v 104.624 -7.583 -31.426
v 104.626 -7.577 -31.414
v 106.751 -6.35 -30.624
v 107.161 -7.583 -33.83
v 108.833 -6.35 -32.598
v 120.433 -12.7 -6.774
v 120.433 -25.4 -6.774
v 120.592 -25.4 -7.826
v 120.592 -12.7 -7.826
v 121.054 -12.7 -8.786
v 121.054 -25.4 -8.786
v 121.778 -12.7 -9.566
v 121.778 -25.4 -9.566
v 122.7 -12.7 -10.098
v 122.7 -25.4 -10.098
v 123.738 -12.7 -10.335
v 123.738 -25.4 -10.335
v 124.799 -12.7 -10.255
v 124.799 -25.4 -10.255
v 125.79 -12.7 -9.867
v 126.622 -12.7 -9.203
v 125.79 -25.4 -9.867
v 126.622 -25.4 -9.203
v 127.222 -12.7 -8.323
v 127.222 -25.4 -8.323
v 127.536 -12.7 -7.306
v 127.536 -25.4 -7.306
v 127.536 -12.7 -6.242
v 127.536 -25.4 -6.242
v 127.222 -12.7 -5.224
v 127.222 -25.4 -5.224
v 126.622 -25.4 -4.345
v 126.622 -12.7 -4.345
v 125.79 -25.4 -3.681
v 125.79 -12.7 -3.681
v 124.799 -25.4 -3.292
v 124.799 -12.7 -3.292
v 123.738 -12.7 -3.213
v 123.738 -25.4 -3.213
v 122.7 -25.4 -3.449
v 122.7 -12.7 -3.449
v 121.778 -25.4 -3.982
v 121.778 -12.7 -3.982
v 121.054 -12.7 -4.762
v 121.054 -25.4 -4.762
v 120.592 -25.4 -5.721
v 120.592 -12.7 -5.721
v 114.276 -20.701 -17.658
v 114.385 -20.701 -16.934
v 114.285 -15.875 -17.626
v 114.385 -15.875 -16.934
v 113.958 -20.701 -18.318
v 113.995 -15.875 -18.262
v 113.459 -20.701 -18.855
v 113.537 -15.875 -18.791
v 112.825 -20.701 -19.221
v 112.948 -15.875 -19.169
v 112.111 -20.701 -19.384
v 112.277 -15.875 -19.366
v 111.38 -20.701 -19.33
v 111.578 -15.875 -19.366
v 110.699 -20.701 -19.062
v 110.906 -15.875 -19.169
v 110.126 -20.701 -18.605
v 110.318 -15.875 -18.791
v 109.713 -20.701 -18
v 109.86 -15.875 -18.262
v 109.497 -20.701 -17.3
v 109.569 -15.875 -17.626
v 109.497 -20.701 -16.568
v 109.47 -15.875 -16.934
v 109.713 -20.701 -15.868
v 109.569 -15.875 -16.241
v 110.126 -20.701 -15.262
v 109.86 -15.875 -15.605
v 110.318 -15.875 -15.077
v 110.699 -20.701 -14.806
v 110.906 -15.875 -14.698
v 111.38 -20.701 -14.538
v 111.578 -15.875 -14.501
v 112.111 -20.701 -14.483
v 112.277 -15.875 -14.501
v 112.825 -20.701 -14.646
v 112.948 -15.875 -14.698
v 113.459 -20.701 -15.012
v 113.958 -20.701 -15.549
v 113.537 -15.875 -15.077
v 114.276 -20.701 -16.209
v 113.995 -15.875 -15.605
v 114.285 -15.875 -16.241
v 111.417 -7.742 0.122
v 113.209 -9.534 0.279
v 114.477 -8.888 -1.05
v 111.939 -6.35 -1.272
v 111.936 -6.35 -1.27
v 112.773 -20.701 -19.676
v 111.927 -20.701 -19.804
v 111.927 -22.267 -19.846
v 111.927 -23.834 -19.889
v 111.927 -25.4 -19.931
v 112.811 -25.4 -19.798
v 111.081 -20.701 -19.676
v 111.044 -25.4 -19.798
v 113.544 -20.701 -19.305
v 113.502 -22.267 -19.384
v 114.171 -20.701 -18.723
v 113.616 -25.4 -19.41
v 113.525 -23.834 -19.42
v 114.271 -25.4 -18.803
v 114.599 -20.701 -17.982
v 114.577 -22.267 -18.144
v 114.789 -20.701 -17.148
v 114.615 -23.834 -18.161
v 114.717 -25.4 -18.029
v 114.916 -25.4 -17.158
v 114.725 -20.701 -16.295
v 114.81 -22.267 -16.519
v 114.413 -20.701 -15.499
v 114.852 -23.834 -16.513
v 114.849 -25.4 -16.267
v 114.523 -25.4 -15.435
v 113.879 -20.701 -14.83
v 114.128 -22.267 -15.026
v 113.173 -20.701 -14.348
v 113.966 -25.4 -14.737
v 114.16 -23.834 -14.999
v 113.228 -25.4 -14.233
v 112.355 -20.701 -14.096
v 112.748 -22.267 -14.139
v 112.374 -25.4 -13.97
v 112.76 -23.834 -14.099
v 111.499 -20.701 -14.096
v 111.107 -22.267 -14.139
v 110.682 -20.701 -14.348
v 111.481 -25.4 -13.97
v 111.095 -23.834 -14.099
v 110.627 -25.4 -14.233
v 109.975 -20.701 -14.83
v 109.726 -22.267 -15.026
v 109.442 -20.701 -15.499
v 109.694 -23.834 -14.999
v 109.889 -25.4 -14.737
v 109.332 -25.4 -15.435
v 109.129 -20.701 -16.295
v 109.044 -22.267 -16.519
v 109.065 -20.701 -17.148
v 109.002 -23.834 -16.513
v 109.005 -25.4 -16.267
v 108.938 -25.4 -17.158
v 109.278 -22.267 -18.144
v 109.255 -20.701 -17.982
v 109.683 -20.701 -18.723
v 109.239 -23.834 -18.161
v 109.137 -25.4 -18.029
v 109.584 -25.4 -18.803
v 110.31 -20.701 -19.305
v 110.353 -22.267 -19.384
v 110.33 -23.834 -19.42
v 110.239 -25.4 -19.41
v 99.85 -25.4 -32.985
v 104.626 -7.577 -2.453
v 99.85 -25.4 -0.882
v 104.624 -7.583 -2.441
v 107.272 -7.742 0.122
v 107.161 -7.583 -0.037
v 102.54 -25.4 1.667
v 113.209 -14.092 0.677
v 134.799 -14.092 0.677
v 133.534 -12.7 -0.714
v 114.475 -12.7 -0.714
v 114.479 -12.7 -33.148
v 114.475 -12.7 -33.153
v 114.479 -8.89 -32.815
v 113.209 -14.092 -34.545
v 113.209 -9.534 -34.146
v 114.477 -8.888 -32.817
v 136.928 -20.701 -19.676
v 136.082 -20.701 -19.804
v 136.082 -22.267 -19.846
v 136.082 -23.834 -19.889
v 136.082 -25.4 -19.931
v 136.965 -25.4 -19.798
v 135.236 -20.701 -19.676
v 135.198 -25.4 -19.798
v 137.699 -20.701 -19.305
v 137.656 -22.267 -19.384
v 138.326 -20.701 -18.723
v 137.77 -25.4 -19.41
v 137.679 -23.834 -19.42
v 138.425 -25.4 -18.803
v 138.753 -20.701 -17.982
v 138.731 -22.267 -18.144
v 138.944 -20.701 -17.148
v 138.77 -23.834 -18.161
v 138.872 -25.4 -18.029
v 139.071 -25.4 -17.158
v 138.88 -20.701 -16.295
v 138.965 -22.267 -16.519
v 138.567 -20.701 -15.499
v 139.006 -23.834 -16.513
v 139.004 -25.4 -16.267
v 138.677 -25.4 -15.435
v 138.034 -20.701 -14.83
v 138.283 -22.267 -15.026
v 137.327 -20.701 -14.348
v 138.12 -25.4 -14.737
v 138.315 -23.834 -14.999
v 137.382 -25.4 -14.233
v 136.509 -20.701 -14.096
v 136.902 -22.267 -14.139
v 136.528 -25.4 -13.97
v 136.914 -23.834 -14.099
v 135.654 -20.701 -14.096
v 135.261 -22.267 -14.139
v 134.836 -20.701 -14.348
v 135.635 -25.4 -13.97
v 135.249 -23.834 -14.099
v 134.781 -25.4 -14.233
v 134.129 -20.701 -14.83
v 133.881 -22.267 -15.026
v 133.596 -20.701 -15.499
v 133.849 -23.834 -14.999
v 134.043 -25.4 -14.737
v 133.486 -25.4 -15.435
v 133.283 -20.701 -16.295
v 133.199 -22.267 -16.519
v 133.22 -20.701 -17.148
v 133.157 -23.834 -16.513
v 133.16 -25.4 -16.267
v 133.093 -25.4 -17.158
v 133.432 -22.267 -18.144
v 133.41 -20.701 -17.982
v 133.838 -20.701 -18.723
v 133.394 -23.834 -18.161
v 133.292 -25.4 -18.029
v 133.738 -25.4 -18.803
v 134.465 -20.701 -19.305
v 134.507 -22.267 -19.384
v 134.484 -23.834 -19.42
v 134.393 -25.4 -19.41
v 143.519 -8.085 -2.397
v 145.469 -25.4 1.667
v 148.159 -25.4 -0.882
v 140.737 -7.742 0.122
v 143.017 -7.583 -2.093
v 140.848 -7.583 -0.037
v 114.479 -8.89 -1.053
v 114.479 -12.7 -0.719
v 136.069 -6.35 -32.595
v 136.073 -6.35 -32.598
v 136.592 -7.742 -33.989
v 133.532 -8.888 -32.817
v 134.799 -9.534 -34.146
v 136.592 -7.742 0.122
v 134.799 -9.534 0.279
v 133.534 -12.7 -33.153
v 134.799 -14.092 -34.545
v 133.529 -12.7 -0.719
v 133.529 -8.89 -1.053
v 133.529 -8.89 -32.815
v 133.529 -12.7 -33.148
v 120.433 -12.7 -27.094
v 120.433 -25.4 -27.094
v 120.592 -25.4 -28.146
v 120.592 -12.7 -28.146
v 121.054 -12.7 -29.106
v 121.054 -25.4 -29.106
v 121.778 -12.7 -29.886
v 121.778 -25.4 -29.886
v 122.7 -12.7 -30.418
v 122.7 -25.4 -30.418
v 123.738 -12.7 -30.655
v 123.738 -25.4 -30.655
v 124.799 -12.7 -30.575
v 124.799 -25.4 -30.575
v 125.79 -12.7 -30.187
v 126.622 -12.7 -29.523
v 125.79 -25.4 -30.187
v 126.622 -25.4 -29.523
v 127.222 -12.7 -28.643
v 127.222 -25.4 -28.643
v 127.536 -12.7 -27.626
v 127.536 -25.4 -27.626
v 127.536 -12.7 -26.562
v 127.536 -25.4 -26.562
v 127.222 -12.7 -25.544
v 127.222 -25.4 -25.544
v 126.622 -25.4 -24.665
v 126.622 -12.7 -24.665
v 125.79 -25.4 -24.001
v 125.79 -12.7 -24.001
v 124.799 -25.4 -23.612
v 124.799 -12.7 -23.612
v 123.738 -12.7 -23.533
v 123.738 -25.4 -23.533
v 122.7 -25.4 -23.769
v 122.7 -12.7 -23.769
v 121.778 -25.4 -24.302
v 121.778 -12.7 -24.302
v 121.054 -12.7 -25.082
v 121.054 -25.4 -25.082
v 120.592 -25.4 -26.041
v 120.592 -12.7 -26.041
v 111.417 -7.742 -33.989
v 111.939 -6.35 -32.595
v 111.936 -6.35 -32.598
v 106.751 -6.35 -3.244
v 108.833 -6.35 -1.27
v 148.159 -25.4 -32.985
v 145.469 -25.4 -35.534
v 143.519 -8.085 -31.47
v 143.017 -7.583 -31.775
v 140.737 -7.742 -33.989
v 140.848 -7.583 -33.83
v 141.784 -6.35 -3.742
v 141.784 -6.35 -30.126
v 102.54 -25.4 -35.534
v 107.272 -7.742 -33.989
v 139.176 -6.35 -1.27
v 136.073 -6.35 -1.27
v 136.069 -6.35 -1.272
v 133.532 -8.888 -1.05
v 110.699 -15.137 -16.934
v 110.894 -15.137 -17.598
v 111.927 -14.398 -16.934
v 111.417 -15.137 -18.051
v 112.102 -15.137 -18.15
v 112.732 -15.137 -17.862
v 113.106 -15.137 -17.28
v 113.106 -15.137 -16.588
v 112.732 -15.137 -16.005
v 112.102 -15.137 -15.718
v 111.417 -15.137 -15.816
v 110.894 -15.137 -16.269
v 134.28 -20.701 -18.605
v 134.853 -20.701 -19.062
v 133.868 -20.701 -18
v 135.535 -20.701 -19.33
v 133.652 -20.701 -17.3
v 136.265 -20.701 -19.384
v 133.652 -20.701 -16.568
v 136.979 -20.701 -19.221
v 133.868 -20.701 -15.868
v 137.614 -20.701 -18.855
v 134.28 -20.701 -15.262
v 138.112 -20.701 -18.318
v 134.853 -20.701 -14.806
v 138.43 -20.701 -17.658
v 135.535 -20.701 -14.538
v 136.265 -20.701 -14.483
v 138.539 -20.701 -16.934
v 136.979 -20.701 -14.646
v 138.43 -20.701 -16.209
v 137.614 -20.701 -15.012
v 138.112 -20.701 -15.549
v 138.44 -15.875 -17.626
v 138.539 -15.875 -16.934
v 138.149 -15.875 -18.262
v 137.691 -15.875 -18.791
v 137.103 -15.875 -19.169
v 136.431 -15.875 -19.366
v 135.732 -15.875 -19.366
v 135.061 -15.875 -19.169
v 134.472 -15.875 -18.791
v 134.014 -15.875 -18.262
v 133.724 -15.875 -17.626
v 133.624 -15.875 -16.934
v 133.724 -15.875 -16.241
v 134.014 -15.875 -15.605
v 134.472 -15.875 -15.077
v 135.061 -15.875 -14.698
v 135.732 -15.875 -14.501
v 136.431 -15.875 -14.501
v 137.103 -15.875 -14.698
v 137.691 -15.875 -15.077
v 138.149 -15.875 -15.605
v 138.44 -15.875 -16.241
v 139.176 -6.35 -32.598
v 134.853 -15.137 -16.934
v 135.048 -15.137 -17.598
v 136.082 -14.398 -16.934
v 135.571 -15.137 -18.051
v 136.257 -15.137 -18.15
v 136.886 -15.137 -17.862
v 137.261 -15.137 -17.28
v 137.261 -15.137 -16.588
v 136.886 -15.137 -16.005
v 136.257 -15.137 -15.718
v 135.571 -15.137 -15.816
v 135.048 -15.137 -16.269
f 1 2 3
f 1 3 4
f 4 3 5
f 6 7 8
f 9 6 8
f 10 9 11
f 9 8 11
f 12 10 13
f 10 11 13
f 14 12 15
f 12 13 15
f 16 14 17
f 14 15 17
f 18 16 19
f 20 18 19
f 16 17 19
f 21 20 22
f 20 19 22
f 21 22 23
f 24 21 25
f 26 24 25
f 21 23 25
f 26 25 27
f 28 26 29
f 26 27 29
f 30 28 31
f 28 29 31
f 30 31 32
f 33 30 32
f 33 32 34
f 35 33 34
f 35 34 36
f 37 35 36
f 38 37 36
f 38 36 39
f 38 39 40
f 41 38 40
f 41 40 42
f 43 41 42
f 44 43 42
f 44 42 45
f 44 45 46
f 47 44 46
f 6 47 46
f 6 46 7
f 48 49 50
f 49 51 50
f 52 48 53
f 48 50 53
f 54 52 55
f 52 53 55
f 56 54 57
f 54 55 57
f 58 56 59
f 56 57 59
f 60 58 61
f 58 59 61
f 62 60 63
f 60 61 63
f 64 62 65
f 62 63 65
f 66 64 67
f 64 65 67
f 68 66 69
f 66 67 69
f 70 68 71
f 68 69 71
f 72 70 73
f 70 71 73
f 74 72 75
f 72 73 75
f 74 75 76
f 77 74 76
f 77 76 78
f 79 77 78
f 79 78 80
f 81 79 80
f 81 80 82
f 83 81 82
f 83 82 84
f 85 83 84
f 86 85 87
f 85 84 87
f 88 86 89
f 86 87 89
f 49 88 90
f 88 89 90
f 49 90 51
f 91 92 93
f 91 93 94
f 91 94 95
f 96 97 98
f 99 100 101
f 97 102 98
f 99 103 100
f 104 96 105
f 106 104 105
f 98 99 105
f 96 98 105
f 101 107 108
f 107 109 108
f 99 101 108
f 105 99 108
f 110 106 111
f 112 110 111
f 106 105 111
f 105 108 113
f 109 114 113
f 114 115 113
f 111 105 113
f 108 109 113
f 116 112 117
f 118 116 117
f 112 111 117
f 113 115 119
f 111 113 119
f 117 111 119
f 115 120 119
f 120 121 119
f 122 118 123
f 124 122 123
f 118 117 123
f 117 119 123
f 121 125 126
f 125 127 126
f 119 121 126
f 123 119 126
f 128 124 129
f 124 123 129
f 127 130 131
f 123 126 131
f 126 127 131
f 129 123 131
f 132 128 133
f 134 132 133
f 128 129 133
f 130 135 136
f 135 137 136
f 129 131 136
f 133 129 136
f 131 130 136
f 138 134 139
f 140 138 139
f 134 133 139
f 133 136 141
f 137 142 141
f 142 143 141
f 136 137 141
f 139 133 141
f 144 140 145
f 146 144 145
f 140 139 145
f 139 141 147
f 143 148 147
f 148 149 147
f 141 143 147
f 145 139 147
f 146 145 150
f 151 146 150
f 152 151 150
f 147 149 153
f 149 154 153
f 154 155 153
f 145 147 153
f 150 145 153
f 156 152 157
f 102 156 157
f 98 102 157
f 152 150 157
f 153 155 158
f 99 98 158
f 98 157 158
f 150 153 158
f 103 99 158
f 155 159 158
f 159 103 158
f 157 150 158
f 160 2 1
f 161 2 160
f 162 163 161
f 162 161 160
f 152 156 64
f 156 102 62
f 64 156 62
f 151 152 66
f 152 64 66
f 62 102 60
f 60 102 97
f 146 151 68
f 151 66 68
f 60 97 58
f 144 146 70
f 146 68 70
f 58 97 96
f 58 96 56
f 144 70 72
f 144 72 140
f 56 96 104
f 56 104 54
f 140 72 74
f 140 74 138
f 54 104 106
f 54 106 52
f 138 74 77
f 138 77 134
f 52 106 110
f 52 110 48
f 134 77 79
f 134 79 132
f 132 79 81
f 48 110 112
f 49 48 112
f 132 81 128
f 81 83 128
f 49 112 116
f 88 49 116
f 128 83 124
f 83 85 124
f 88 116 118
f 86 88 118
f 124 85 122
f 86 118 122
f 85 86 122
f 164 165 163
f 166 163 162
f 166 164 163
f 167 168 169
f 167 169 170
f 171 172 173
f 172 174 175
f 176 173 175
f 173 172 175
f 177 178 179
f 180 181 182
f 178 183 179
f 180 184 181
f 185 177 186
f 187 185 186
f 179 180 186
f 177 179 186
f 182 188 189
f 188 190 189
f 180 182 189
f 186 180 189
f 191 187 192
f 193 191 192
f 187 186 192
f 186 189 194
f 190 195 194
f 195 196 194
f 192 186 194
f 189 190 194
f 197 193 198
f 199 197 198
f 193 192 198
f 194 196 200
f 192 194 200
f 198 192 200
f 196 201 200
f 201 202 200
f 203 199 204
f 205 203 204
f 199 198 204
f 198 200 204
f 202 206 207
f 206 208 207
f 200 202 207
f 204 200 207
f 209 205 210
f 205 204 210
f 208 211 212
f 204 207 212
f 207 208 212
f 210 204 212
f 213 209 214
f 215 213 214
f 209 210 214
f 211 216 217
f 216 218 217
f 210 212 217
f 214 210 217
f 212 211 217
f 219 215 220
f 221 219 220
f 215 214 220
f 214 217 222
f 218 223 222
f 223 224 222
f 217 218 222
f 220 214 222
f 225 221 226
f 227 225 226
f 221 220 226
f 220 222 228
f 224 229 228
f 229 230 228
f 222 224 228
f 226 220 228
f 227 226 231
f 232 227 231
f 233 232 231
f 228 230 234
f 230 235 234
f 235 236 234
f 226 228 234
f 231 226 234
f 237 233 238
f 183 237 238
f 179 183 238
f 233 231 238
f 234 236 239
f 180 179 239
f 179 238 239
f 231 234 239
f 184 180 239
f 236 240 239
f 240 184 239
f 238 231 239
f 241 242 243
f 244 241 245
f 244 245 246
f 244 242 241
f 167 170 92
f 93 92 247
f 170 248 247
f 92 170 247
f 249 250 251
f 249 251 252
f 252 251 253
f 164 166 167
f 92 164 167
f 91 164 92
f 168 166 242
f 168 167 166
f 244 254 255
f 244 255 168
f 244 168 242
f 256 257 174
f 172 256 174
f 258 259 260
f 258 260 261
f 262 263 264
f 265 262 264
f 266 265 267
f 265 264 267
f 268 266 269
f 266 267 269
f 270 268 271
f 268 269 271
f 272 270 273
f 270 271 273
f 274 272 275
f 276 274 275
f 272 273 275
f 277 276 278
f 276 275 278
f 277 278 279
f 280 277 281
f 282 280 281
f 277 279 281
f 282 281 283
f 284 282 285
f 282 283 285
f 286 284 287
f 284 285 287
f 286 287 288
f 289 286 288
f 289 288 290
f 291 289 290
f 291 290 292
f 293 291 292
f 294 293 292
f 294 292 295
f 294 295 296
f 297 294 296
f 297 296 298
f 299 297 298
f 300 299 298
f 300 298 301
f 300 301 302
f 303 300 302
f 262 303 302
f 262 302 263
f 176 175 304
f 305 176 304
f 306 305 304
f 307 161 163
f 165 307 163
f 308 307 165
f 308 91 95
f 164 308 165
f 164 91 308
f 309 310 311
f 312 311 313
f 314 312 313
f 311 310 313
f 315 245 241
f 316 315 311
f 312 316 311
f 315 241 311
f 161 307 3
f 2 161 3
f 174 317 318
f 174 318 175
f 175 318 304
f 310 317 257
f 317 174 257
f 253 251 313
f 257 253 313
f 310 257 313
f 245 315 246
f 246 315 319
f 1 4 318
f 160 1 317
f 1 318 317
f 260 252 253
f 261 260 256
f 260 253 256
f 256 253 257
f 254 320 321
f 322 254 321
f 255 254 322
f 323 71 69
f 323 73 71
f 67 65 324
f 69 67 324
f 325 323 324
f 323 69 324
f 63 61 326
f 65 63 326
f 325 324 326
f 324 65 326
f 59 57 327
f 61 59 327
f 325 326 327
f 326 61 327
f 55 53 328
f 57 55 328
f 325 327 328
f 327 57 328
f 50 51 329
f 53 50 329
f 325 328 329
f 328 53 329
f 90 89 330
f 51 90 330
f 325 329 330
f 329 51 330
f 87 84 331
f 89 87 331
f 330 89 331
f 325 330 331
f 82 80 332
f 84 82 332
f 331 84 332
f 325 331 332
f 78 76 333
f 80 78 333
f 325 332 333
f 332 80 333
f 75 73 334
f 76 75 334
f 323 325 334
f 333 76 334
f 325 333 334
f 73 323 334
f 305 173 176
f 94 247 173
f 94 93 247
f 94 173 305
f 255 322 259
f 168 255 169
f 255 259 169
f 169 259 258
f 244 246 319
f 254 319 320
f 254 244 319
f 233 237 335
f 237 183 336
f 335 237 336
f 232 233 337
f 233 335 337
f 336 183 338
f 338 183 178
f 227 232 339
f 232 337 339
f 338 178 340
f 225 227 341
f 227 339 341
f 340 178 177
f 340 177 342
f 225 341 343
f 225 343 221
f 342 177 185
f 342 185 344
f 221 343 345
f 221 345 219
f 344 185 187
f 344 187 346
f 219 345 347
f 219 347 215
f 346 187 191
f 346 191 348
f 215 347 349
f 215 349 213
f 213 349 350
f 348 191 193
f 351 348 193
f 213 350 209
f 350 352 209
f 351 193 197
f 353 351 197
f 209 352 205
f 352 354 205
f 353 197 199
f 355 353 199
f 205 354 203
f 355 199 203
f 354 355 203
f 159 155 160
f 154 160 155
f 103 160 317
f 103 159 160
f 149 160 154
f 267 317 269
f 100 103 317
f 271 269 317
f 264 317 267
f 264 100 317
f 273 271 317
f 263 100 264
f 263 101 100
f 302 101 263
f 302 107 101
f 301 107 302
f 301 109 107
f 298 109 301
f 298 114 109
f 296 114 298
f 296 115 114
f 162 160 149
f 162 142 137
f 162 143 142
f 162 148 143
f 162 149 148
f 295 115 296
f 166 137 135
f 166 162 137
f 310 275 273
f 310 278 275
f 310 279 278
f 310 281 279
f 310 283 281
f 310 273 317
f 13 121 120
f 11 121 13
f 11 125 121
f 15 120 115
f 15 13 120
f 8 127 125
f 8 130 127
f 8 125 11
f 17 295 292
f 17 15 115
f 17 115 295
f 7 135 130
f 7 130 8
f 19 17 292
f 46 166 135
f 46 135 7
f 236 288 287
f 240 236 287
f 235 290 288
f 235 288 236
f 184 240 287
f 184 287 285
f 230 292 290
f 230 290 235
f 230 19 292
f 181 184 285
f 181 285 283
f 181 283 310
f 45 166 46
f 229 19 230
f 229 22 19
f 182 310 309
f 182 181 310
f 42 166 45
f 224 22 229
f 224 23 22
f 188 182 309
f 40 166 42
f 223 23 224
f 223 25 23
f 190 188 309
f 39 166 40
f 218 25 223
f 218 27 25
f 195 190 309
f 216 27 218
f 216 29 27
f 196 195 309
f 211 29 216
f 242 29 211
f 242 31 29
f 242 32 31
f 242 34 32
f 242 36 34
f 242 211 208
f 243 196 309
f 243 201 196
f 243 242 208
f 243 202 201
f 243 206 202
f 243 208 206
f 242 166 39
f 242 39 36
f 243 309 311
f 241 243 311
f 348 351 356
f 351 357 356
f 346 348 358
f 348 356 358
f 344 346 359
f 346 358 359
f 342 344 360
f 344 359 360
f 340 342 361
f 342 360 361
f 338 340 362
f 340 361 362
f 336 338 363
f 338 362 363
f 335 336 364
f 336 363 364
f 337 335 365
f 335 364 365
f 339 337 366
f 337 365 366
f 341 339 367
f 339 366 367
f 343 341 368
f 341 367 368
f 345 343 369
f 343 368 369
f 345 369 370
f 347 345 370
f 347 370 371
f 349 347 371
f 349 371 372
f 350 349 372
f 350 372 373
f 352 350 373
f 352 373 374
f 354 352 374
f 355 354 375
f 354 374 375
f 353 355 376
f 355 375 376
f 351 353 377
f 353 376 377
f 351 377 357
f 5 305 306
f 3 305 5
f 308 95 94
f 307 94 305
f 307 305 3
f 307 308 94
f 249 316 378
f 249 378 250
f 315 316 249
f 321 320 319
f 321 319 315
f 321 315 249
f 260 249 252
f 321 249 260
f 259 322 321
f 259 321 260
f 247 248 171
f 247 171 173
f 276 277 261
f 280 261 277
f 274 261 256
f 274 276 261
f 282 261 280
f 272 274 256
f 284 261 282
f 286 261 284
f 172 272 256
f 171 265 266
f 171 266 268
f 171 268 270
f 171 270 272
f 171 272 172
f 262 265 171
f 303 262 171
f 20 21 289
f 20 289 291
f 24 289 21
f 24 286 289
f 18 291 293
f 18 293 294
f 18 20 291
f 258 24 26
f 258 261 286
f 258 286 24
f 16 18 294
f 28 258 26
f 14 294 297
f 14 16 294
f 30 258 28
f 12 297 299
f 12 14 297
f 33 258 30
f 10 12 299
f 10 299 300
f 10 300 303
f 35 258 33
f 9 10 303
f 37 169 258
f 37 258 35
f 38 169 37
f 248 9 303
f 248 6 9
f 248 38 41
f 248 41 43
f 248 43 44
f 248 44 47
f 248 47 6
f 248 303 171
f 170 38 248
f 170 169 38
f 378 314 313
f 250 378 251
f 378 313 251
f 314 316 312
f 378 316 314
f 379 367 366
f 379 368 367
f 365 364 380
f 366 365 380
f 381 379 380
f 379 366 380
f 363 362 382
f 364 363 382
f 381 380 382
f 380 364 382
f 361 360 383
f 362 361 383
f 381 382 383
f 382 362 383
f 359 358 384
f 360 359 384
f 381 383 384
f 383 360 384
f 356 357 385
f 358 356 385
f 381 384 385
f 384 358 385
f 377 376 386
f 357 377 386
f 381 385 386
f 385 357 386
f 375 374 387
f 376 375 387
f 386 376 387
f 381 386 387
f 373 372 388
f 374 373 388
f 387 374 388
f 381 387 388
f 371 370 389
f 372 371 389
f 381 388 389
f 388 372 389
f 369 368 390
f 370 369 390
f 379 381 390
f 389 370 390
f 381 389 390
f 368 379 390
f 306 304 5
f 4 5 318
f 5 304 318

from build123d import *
from OCP.BRepFilletAPI import BRepFilletAPI_MakeChamfer

# Parameters (mm, degrees)
BOSS_EXTRUDE1_DEPTH       = 33.86758938
F_1_4_CLEARANCE_HOLE1_D   = 7.14248
DRAFT1_ANGLE              = 15
DRAFT2_ANGLE              = 15
DRAFT3_ANGLE              = 5
DRAFT4_ANGLE              = 5
CHAMFER1_SIZE             = 2.54
CHAMFER1_SIZE2            = 2.599295174
CHAMFER2_SIZE             = 1.27
CHAMFER2_SIZE2            = 1.356155551
CHAMFER2_SIZE2_2          = 1.397079842
CHAMFER2_SIZE2_3          = 1.796051224
CHAMFER2_SIZE2_4          = 1.739452222
HOLE1_AT_2_COUNT          = 2
HOLE1_AT_2_PITCH          = 24.154432116
F_8_CLEARANCE_HOLE1_D     = 4.9149
F_8_CLEARANCE_HOLE1_DEPTH = 9.525
F_8_CLEARANCE_HOLE1_TIP   = 1.476584928


with BuildPart() as part:
    # Sketch1 → Boss-Extrude1 (new body)
    with BuildSketch(Plane.XY):
        Polygon((133.529465969, -12.7), (114.479465969, -12.7), (114.479465969, -8.89), (111.939465969, -6.35), (107.494465969, -6.35), (104.954465969, -6.35), (104.954465969, -25.4), (143.054465969, -25.4), (143.054465969, -6.35), (140.514465969, -6.35), (136.069465969, -6.35), (133.529465969, -8.89), align=None)
    extrude(amount=-BOSS_EXTRUDE1_DEPTH)

    # 1/4 Clearance Hole1 (through all)
    with Locations(Plane(origin=(0, -12.7, 0), x_dir=(1, 0, 0), z_dir=(0, 1, 0))):
        with Locations((124.004465969, 6.77379469), (124.004465969, 27.09379469)):
            Hole(F_1_4_CLEARANCE_HOLE1_D / 2)

    # Draft1
    draft1_faces = [part.faces().sort_by_distance(p)[0] for p in [
        (143.054465969, -15.875, -16.93379469),
    ]]
    draft(draft1_faces, Plane(origin=(140.514465969, -6.35, -76.464684351), x_dir=(1, 0, 0), z_dir=(0, 1, 0)), DRAFT1_ANGLE)

    # Draft2
    draft2_faces = [part.faces().sort_by_distance(p)[0] for p in [
        (104.954465969, -15.875, -16.93379469),
    ]]
    draft(draft2_faces, Plane(origin=(140.514465969, -6.35, -76.464684351), x_dir=(1, 0, 0), z_dir=(0, 1, 0)), DRAFT2_ANGLE)

    # Draft3
    draft3_faces = [part.faces().sort_by_distance(p)[0] for p in [
        (124.004465969, -17.503560526, 0),
    ]]
    draft(draft3_faces, Plane(origin=(140.514465969, -6.35, -76.464684351), x_dir=(1, 0, 0), z_dir=(0, 1, 0)), DRAFT3_ANGLE)

    # Draft4
    draft4_faces = [part.faces().sort_by_distance(p)[0] for p in [
        (124.004465969, -17.503560526, -33.86758938),
    ]]
    draft(draft4_faces, Plane(origin=(140.514465969, -6.35, -76.464684351), x_dir=(1, 0, 0), z_dir=(0, 1, 0)), DRAFT4_ANGLE)

    # Chamfer1: one chamfer whose edges measure the first distance from different faces: ONE call of the kernel's chamfer builder (chamfer() names one face for all edges)
    chamfer1_edges_1 = [part.edges().sort_by_distance(p)[0] for p in [
        (145.606682027, -15.875, 0.83332952),
        (145.606682027, -15.875, -34.7009189),
    ]]
    chamfer1_side_1 = [part.faces().sort_by_distance(p)[0] for p in [
        (145.646584132, -16.023916684, -16.93379469),
    ]]
    chamfer1_edges_2 = [part.edges().sort_by_distance(p)[0] for p in [
        (102.402249911, -15.875, 0.83332952),
        (102.402249911, -15.875, -34.7009189),
    ]]
    chamfer1_side_2 = [part.faces().sort_by_distance(p)[0] for p in [
        (102.362347806, -16.023916684, -16.93379469),
    ]]
    chamfer1 = BRepFilletAPI_MakeChamfer(part.part.solid().wrapped)
    for e in chamfer1_edges_1:
        chamfer1.Add(CHAMFER1_SIZE, CHAMFER1_SIZE2, e.wrapped, chamfer1_side_1[0].wrapped)  # the first distance lies on this face
    for e in chamfer1_edges_2:
        chamfer1.Add(CHAMFER1_SIZE, CHAMFER1_SIZE2, e.wrapped, chamfer1_side_2[0].wrapped)  # the first distance lies on this face
    add(Compound.cast(chamfer1.Shape()), mode=Mode.REPLACE)

    # Chamfer2: one chamfer whose edges measure the first distance from different faces: ONE call of the kernel's chamfer builder (chamfer() names one face for all edges)
    chamfer2_edges_1 = [part.edges().sort_by_distance(p)[0] for p in [
        (134.799465969, -7.62, 0.111110603),
        (134.799465969, -7.62, -33.978699983),
    ]]
    chamfer2_side_1 = [part.faces().sort_by_distance(p)[0] for p in [
        (134.796706387, -7.622759582, -16.93379469),
    ]]
    chamfer2_edges_2 = [part.edges().sort_by_distance(p)[0] for p in [
        (109.792117792, -6.35, 0),
        (109.792117792, -6.35, -33.86758938),
    ]]
    chamfer2_side_2 = [part.faces().sort_by_distance(p)[0] for p in [
        (108.524459453, -6.35, -16.93379469),
    ]]
    chamfer2_edges_3 = [part.edges().sort_by_distance(p)[0] for p in [
        (113.209465969, -7.62, 0.111110603),
        (113.209465969, -7.62, -33.978699983),
    ]]
    chamfer2_side_3 = [part.faces().sort_by_distance(p)[0] for p in [
        (113.212225552, -7.622759582, -16.93379469),
    ]]
    chamfer2_edges_4 = [part.edges().sort_by_distance(p)[0] for p in [
        (114.479465969, -10.795, 0.388887109),
        (133.529465969, -10.795, 0.388887109),
        (114.479465969, -10.795, -34.256476489),
        (133.529465969, -10.795, -34.256476489),
    ]]
    chamfer2_edges_5 = [part.edges().sort_by_distance(p)[0] for p in [
        (124.004465969, -12.7, 0.555553013),
        (124.004465969, -12.7, -34.423142393),
    ]]
    chamfer2_side_5 = [part.faces().sort_by_distance(p)[0] for p in [
        (124.004465969, -12.7, -16.93379469),
    ]]
    chamfer2_edges_6 = [part.edges().sort_by_distance(p)[0] for p in [
        (138.216814146, -6.35, -33.86758938),
        (138.216814146, -6.35, 0),
    ]]
    chamfer2_side_6 = [part.faces().sort_by_distance(p)[0] for p in [
        (139.484472486, -6.35, -16.93379469),
    ]]
    chamfer2_edges_7 = [part.edges().sort_by_distance(p)[0] for p in [
        (104.954465969, -6.35, -16.93379469),
    ]]
    chamfer2_side_7 = [part.faces().sort_by_distance(p)[0] for p in [
        (102.355664133, -16.048860491, -16.93379469),
    ]]
    chamfer2_edges_8 = [part.edges().sort_by_distance(p)[0] for p in [
        (106.299617792, -6.35, -1.274526802),
    ]]
    chamfer2_side_8 = [part.faces().sort_by_distance(p)[0] for p in [
        (103.747401735, -15.875, -0.441197282),
    ]]
    chamfer2_edges_9 = [part.edges().sort_by_distance(p)[0] for p in [
        (106.299617792, -6.35, -32.593062578),
    ]]
    chamfer2_side_9 = [part.faces().sort_by_distance(p)[0] for p in [
        (103.747401735, -15.875, -33.426392098),
    ]]
    chamfer2_edges_10 = [part.edges().sort_by_distance(p)[0] for p in [
        (143.054465969, -6.35, -16.93379469),
    ]]
    chamfer2_side_10 = [part.faces().sort_by_distance(p)[0] for p in [
        (139.484472486, -6.35, -16.93379469),
    ]]
    chamfer2_edges_11 = [part.edges().sort_by_distance(p)[0] for p in [
        (141.709314146, -6.35, -1.274526802),
    ]]
    chamfer2_side_11 = [part.faces().sort_by_distance(p)[0] for p in [
        (144.261530204, -15.875, -0.441197282),
    ]]
    chamfer2_edges_12 = [part.edges().sort_by_distance(p)[0] for p in [
        (141.709314146, -6.35, -32.593062578),
    ]]
    chamfer2_side_12 = [part.faces().sort_by_distance(p)[0] for p in [
        (144.261530204, -15.875, -33.426392098),
    ]]
    chamfer2 = BRepFilletAPI_MakeChamfer(part.part.solid().wrapped)
    for e in chamfer2_edges_1:
        chamfer2.Add(CHAMFER2_SIZE, CHAMFER2_SIZE2, e.wrapped, chamfer2_side_1[0].wrapped)  # the first distance lies on this face
    for e in chamfer2_edges_2:
        chamfer2.Add(CHAMFER2_SIZE, CHAMFER2_SIZE2_2, e.wrapped, chamfer2_side_2[0].wrapped)  # the first distance lies on this face
    for e in chamfer2_edges_3:
        chamfer2.Add(CHAMFER2_SIZE, CHAMFER2_SIZE2, e.wrapped, chamfer2_side_3[0].wrapped)  # the first distance lies on this face
    for e in chamfer2_edges_4:
        chamfer2.Add(CHAMFER2_SIZE, e.wrapped)
    for e in chamfer2_edges_5:
        chamfer2.Add(CHAMFER2_SIZE, CHAMFER2_SIZE2_2, e.wrapped, chamfer2_side_5[0].wrapped)  # the first distance lies on this face
    for e in chamfer2_edges_6:
        chamfer2.Add(CHAMFER2_SIZE, CHAMFER2_SIZE2_2, e.wrapped, chamfer2_side_6[0].wrapped)  # the first distance lies on this face
    for e in chamfer2_edges_7:
        chamfer2.Add(CHAMFER2_SIZE, CHAMFER2_SIZE2_3, e.wrapped, chamfer2_side_7[0].wrapped)  # the first distance lies on this face
    for e in chamfer2_edges_8:
        chamfer2.Add(CHAMFER2_SIZE, CHAMFER2_SIZE2_4, e.wrapped, chamfer2_side_8[0].wrapped)  # the first distance lies on this face
    for e in chamfer2_edges_9:
        chamfer2.Add(CHAMFER2_SIZE, CHAMFER2_SIZE2_4, e.wrapped, chamfer2_side_9[0].wrapped)  # the first distance lies on this face
    for e in chamfer2_edges_10:
        chamfer2.Add(CHAMFER2_SIZE, CHAMFER2_SIZE2_3, e.wrapped, chamfer2_side_10[0].wrapped)  # the first distance lies on this face
    for e in chamfer2_edges_11:
        chamfer2.Add(CHAMFER2_SIZE, CHAMFER2_SIZE2_4, e.wrapped, chamfer2_side_11[0].wrapped)  # the first distance lies on this face
    for e in chamfer2_edges_12:
        chamfer2.Add(CHAMFER2_SIZE, CHAMFER2_SIZE2_4, e.wrapped, chamfer2_side_12[0].wrapped)  # the first distance lies on this face
    add(Compound.cast(chamfer2.Shape()), mode=Mode.REPLACE)

    # Sketch5 → Hole1 (revolve, cut)
    with BuildSketch(Plane(origin=(111.927249911, -25.4, -16.93379469), x_dir=(0, 0, -1), z_dir=(1, 0, 0))):
        Polygon((0, 0), (0, 4.699), (2.8702, 4.699), (2.9972, 0), align=None)
    hole1 = revolve(axis=Axis((111.927249911, 84.6, -16.93379469), (0, -1, 0)), mode=Mode.SUBTRACT)

    # Hole1 at 2: Hole1 ×2
    with Locations(*[(i * HOLE1_AT_2_PITCH, 0, 0) for i in range(1, HOLE1_AT_2_COUNT)]):
        add(hole1, mode=Mode.SUBTRACT)

    # #8 Clearance Hole1
    with Locations(Plane(origin=(0, -25.4, 0), x_dir=(-1, 0, 0), z_dir=(0, -1, 0))):
        with Locations((-136.081682027, 16.93379469), (-111.927249911, 16.93379469)):
            Hole(F_8_CLEARANCE_HOLE1_D / 2, depth=F_8_CLEARANCE_HOLE1_DEPTH)
            with Locations((0, 0, -(F_8_CLEARANCE_HOLE1_DEPTH + F_8_CLEARANCE_HOLE1_TIP / 2))):  # 118° drill point
                Cone(0, F_8_CLEARANCE_HOLE1_D / 2, F_8_CLEARANCE_HOLE1_TIP, mode=Mode.SUBTRACT)


solid = part.part
